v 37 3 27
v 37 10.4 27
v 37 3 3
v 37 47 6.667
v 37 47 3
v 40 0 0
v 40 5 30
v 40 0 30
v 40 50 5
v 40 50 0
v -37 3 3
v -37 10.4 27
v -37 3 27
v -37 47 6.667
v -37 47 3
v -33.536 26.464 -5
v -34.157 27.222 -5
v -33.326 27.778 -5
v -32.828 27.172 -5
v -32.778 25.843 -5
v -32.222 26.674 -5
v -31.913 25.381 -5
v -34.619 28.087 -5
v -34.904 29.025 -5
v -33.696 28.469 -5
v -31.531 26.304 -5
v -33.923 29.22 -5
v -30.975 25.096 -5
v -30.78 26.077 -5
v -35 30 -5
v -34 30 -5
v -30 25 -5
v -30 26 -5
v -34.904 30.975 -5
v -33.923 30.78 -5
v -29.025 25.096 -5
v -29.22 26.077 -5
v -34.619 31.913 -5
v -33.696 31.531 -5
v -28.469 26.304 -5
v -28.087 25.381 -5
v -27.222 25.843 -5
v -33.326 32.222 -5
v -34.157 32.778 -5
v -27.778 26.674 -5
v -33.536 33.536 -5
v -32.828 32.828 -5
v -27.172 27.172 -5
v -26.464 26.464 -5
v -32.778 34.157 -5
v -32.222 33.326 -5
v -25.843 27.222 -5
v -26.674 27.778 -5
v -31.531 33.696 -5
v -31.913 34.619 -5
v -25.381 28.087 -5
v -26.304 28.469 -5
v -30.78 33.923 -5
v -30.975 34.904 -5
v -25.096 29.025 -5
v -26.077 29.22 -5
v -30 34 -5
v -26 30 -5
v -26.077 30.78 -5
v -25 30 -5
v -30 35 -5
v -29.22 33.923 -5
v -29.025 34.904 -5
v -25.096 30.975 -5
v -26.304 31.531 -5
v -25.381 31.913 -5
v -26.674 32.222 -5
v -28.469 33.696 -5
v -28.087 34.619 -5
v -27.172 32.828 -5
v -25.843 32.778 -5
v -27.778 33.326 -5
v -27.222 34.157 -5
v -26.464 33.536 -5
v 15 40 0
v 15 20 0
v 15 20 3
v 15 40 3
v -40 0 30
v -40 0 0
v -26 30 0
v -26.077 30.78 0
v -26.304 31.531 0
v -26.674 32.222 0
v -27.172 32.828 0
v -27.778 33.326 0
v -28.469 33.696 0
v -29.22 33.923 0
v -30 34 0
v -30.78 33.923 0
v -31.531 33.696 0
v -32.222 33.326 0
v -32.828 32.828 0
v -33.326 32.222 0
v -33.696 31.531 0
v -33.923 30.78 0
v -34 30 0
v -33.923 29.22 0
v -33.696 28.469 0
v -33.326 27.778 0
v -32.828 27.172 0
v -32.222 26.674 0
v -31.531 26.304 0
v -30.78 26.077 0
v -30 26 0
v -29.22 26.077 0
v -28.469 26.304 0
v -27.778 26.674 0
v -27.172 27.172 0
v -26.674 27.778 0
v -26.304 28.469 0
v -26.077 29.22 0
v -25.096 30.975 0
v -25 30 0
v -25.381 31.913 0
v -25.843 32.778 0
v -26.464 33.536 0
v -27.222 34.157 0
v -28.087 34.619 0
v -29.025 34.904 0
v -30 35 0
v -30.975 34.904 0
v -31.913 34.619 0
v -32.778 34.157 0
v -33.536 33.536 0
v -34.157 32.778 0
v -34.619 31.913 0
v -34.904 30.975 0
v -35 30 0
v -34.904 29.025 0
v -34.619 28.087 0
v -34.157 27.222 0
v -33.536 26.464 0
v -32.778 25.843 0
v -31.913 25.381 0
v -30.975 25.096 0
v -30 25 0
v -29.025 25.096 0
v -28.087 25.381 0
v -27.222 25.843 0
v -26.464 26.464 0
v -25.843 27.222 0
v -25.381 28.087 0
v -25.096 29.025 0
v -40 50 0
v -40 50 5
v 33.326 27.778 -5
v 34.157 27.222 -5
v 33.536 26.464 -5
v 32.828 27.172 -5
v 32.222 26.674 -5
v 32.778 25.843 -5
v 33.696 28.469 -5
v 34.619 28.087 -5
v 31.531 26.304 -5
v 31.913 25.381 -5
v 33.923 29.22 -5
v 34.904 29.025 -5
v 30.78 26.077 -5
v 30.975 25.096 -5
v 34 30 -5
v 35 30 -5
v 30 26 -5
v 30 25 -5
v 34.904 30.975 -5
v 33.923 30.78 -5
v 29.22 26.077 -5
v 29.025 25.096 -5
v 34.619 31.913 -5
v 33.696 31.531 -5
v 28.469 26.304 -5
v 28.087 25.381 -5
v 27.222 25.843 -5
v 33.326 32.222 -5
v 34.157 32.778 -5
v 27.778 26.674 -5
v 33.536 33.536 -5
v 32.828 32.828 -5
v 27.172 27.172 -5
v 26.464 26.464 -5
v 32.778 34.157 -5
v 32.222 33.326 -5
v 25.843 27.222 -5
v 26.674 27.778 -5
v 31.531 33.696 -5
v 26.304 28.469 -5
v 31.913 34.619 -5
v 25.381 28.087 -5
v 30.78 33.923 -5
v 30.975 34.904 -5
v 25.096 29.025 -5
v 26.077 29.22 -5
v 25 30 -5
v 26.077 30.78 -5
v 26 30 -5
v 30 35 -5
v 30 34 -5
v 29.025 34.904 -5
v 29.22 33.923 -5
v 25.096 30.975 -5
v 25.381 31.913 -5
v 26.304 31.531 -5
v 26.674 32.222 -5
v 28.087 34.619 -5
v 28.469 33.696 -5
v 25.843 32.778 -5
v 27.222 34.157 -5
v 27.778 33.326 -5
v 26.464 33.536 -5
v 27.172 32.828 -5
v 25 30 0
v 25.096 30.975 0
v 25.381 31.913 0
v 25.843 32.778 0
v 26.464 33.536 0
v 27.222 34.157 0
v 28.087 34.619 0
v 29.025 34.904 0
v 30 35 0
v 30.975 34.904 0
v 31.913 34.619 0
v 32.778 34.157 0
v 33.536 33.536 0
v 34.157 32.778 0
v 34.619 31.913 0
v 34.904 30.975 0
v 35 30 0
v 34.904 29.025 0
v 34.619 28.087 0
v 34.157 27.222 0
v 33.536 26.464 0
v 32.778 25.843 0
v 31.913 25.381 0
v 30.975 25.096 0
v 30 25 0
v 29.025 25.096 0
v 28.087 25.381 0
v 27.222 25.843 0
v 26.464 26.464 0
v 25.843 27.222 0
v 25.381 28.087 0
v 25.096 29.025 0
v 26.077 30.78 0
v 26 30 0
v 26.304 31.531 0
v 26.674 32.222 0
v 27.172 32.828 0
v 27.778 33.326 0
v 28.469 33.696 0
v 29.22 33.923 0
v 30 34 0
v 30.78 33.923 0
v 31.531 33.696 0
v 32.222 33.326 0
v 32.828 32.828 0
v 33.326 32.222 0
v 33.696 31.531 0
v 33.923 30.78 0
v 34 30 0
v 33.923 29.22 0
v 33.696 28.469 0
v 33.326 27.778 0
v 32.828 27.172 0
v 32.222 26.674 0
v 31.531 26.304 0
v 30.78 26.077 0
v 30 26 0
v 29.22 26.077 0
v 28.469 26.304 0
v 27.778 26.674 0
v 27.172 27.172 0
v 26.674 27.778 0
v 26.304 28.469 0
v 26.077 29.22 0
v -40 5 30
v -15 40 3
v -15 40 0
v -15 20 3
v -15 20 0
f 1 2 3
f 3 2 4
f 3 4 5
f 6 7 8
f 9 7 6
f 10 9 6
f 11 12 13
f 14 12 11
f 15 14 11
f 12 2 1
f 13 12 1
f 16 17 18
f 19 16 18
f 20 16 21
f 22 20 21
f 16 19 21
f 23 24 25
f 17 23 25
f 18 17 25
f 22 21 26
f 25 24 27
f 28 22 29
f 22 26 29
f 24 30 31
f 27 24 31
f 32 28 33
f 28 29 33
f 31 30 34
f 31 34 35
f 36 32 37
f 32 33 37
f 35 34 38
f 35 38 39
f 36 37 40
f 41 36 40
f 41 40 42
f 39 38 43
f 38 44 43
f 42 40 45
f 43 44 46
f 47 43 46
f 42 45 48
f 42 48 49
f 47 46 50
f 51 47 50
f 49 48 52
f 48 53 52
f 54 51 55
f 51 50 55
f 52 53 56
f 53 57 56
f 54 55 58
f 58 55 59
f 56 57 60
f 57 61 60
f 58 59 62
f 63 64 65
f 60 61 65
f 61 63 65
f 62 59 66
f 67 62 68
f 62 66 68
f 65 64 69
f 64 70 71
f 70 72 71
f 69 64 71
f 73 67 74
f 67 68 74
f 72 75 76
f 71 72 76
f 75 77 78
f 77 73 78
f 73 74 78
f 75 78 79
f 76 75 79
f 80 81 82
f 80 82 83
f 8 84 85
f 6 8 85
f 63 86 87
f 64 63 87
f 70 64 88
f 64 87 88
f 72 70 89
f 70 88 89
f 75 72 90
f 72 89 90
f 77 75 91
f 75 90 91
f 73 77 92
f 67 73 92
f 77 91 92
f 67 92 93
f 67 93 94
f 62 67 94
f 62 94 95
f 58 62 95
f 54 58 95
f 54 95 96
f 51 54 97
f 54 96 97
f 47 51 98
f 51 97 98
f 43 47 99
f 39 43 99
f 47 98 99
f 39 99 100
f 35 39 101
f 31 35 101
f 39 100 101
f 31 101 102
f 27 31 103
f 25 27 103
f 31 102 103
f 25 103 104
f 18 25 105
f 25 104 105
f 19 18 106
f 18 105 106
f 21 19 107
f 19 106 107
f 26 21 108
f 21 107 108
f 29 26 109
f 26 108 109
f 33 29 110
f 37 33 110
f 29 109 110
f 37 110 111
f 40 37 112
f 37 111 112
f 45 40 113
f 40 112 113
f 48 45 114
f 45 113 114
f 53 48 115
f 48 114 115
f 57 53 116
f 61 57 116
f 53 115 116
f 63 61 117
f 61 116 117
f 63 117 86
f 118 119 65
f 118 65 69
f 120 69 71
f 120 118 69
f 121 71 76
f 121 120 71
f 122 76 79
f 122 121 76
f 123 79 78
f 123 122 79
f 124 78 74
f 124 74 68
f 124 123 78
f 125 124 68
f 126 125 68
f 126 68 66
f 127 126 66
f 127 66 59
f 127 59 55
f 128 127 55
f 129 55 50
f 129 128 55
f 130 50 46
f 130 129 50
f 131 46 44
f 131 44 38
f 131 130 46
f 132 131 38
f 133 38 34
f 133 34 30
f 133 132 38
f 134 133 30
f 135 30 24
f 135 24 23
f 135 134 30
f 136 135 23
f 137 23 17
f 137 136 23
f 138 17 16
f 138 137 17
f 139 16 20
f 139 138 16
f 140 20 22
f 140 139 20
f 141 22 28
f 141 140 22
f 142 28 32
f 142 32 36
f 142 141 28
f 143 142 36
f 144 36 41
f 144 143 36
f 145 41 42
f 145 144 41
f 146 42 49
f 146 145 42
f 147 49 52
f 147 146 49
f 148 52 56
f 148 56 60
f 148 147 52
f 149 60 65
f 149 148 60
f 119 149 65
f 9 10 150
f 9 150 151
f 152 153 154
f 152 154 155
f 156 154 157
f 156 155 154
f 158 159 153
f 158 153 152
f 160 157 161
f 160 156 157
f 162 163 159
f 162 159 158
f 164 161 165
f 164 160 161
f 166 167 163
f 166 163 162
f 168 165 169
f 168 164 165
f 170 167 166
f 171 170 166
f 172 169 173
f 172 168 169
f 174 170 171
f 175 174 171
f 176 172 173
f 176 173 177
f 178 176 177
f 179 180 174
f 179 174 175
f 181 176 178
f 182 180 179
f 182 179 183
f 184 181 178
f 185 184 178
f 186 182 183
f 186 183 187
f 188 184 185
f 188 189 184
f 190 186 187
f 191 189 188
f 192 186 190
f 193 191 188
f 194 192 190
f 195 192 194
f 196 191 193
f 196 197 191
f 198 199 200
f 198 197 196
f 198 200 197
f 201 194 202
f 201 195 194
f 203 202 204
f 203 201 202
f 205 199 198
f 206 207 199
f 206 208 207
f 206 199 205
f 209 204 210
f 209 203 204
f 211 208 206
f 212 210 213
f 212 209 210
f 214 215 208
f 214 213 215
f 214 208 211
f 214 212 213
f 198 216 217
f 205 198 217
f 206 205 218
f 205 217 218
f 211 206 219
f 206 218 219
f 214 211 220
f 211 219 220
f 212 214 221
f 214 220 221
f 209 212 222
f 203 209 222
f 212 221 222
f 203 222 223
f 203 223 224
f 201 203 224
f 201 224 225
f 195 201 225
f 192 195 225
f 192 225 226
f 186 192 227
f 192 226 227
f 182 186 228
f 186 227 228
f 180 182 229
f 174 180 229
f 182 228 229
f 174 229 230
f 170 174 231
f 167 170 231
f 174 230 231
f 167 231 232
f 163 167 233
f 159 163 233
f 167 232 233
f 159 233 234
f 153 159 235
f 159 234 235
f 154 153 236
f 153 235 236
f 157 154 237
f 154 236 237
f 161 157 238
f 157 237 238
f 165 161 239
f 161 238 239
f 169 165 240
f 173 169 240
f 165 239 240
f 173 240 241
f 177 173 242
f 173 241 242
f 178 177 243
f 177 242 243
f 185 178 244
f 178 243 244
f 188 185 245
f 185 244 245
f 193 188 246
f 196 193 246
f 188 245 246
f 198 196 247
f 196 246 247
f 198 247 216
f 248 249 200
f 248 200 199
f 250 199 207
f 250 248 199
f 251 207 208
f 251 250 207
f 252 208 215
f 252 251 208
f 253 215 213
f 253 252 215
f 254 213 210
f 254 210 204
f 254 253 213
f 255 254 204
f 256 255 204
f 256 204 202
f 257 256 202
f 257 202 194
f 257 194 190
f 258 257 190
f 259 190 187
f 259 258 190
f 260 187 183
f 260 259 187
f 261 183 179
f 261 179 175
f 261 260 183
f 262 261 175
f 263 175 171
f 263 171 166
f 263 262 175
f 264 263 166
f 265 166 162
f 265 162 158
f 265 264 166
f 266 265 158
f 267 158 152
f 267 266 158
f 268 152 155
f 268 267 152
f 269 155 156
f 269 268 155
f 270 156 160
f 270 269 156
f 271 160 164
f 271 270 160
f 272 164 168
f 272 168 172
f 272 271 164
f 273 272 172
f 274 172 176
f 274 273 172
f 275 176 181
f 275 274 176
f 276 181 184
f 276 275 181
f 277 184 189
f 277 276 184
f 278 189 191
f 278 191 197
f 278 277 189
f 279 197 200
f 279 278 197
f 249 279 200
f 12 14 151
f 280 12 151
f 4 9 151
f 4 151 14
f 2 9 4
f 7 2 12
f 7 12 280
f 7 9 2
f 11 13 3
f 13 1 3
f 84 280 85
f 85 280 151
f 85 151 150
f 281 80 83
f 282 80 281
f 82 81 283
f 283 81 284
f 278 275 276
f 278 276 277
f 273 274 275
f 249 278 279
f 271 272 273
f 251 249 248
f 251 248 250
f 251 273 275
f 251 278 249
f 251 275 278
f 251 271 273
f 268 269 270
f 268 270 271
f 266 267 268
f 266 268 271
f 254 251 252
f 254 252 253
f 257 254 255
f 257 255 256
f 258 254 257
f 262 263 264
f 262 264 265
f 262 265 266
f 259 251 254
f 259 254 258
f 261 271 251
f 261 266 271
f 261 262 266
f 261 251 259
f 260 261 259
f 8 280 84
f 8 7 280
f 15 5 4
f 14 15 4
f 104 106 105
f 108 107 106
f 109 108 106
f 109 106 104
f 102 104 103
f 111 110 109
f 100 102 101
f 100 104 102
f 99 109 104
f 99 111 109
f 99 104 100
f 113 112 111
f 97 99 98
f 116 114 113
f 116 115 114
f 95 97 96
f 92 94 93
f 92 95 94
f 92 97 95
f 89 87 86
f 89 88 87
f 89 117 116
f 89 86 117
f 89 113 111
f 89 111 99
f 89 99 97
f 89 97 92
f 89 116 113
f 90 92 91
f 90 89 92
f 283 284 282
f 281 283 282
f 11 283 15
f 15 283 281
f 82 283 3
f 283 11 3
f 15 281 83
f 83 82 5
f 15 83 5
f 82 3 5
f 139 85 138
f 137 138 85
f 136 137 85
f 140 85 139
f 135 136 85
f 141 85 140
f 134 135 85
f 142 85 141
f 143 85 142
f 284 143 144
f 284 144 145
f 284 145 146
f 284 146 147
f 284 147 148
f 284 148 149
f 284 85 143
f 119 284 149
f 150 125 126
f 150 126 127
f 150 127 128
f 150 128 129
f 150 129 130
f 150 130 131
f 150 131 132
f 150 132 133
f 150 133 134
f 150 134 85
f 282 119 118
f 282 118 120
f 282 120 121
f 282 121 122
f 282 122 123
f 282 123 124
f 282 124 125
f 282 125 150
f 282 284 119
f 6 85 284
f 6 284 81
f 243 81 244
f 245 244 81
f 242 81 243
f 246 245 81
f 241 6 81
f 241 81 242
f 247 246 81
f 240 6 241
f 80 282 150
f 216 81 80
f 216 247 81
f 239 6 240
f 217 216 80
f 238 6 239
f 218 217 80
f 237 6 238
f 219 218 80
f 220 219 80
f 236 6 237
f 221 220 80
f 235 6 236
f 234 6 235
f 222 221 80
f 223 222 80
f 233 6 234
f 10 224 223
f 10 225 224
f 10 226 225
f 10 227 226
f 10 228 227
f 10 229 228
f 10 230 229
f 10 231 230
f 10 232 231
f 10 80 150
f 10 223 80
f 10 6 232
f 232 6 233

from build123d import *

# Parameters (mm, degrees)
P_IDAT_VYSUNUT_M1_DEPTH  = 40
SKO_EPINA1_T             = -3
SKICA2_W                 = 30
SKICA2_H                 = 20
ODEBRAT_VYSUNUT_M1_DEPTH = 80
SKICA2_3_R               = 5
SKICA2_3_R_2             = 4
P_IDAT_VYSUNUT_M2_DEPTH  = 5


with BuildPart() as part:
    # Skica1 → P_idat vysunut_m1 (new, symmetric)
    with BuildSketch(Plane(origin=(0, 0, 0), x_dir=(0, 0, -1), z_dir=(1, 0, 0))):
        Polygon((-30, 0), (0, 0), (0, 50), (-5, 50), (-30, 5), align=None)
    extrude(amount=P_IDAT_VYSUNUT_M1_DEPTH, both=True)

    # Sko_epina1
    sko_epina1_openings = [part.faces().sort_by_distance(p)[0] for p in [
        (0, 27.5, 17.5),
    ]]
    offset(amount=SKO_EPINA1_T, openings=sko_epina1_openings, kind=Kind.INTERSECTION)

    # Skica2 → Odebrat vysunut_m1 (cut)
    with BuildSketch(Plane(origin=(0, 0, 0), x_dir=(-1, 0, 0), z_dir=(0, 0, -1))):
        with Locations((0, 30)):
            Rectangle(SKICA2_W, SKICA2_H)
    extrude(amount=-ODEBRAT_VYSUNUT_M1_DEPTH, mode=Mode.SUBTRACT)

    # Skica2<3> → P_idat vysunut_m2 (add)
    with BuildSketch(Plane(origin=(0, 0, 0), x_dir=(-1, 0, 0), z_dir=(0, 0, -1))):
        with Locations((-30, 30)):
            Circle(SKICA2_3_R)
        with Locations((-30, 30)):
            Circle(SKICA2_3_R_2, mode=Mode.SUBTRACT)
    p_idat_vysunut_m2 = extrude(amount=P_IDAT_VYSUNUT_M2_DEPTH)

    # Zrcadlit1: P_idat vysunut_m2 across plane
    add(p_idat_vysunut_m2.mirror(Plane(origin=(0, 0, 0), x_dir=(0, 0, 1), z_dir=(1, 0, 0))))


solid = part.part
